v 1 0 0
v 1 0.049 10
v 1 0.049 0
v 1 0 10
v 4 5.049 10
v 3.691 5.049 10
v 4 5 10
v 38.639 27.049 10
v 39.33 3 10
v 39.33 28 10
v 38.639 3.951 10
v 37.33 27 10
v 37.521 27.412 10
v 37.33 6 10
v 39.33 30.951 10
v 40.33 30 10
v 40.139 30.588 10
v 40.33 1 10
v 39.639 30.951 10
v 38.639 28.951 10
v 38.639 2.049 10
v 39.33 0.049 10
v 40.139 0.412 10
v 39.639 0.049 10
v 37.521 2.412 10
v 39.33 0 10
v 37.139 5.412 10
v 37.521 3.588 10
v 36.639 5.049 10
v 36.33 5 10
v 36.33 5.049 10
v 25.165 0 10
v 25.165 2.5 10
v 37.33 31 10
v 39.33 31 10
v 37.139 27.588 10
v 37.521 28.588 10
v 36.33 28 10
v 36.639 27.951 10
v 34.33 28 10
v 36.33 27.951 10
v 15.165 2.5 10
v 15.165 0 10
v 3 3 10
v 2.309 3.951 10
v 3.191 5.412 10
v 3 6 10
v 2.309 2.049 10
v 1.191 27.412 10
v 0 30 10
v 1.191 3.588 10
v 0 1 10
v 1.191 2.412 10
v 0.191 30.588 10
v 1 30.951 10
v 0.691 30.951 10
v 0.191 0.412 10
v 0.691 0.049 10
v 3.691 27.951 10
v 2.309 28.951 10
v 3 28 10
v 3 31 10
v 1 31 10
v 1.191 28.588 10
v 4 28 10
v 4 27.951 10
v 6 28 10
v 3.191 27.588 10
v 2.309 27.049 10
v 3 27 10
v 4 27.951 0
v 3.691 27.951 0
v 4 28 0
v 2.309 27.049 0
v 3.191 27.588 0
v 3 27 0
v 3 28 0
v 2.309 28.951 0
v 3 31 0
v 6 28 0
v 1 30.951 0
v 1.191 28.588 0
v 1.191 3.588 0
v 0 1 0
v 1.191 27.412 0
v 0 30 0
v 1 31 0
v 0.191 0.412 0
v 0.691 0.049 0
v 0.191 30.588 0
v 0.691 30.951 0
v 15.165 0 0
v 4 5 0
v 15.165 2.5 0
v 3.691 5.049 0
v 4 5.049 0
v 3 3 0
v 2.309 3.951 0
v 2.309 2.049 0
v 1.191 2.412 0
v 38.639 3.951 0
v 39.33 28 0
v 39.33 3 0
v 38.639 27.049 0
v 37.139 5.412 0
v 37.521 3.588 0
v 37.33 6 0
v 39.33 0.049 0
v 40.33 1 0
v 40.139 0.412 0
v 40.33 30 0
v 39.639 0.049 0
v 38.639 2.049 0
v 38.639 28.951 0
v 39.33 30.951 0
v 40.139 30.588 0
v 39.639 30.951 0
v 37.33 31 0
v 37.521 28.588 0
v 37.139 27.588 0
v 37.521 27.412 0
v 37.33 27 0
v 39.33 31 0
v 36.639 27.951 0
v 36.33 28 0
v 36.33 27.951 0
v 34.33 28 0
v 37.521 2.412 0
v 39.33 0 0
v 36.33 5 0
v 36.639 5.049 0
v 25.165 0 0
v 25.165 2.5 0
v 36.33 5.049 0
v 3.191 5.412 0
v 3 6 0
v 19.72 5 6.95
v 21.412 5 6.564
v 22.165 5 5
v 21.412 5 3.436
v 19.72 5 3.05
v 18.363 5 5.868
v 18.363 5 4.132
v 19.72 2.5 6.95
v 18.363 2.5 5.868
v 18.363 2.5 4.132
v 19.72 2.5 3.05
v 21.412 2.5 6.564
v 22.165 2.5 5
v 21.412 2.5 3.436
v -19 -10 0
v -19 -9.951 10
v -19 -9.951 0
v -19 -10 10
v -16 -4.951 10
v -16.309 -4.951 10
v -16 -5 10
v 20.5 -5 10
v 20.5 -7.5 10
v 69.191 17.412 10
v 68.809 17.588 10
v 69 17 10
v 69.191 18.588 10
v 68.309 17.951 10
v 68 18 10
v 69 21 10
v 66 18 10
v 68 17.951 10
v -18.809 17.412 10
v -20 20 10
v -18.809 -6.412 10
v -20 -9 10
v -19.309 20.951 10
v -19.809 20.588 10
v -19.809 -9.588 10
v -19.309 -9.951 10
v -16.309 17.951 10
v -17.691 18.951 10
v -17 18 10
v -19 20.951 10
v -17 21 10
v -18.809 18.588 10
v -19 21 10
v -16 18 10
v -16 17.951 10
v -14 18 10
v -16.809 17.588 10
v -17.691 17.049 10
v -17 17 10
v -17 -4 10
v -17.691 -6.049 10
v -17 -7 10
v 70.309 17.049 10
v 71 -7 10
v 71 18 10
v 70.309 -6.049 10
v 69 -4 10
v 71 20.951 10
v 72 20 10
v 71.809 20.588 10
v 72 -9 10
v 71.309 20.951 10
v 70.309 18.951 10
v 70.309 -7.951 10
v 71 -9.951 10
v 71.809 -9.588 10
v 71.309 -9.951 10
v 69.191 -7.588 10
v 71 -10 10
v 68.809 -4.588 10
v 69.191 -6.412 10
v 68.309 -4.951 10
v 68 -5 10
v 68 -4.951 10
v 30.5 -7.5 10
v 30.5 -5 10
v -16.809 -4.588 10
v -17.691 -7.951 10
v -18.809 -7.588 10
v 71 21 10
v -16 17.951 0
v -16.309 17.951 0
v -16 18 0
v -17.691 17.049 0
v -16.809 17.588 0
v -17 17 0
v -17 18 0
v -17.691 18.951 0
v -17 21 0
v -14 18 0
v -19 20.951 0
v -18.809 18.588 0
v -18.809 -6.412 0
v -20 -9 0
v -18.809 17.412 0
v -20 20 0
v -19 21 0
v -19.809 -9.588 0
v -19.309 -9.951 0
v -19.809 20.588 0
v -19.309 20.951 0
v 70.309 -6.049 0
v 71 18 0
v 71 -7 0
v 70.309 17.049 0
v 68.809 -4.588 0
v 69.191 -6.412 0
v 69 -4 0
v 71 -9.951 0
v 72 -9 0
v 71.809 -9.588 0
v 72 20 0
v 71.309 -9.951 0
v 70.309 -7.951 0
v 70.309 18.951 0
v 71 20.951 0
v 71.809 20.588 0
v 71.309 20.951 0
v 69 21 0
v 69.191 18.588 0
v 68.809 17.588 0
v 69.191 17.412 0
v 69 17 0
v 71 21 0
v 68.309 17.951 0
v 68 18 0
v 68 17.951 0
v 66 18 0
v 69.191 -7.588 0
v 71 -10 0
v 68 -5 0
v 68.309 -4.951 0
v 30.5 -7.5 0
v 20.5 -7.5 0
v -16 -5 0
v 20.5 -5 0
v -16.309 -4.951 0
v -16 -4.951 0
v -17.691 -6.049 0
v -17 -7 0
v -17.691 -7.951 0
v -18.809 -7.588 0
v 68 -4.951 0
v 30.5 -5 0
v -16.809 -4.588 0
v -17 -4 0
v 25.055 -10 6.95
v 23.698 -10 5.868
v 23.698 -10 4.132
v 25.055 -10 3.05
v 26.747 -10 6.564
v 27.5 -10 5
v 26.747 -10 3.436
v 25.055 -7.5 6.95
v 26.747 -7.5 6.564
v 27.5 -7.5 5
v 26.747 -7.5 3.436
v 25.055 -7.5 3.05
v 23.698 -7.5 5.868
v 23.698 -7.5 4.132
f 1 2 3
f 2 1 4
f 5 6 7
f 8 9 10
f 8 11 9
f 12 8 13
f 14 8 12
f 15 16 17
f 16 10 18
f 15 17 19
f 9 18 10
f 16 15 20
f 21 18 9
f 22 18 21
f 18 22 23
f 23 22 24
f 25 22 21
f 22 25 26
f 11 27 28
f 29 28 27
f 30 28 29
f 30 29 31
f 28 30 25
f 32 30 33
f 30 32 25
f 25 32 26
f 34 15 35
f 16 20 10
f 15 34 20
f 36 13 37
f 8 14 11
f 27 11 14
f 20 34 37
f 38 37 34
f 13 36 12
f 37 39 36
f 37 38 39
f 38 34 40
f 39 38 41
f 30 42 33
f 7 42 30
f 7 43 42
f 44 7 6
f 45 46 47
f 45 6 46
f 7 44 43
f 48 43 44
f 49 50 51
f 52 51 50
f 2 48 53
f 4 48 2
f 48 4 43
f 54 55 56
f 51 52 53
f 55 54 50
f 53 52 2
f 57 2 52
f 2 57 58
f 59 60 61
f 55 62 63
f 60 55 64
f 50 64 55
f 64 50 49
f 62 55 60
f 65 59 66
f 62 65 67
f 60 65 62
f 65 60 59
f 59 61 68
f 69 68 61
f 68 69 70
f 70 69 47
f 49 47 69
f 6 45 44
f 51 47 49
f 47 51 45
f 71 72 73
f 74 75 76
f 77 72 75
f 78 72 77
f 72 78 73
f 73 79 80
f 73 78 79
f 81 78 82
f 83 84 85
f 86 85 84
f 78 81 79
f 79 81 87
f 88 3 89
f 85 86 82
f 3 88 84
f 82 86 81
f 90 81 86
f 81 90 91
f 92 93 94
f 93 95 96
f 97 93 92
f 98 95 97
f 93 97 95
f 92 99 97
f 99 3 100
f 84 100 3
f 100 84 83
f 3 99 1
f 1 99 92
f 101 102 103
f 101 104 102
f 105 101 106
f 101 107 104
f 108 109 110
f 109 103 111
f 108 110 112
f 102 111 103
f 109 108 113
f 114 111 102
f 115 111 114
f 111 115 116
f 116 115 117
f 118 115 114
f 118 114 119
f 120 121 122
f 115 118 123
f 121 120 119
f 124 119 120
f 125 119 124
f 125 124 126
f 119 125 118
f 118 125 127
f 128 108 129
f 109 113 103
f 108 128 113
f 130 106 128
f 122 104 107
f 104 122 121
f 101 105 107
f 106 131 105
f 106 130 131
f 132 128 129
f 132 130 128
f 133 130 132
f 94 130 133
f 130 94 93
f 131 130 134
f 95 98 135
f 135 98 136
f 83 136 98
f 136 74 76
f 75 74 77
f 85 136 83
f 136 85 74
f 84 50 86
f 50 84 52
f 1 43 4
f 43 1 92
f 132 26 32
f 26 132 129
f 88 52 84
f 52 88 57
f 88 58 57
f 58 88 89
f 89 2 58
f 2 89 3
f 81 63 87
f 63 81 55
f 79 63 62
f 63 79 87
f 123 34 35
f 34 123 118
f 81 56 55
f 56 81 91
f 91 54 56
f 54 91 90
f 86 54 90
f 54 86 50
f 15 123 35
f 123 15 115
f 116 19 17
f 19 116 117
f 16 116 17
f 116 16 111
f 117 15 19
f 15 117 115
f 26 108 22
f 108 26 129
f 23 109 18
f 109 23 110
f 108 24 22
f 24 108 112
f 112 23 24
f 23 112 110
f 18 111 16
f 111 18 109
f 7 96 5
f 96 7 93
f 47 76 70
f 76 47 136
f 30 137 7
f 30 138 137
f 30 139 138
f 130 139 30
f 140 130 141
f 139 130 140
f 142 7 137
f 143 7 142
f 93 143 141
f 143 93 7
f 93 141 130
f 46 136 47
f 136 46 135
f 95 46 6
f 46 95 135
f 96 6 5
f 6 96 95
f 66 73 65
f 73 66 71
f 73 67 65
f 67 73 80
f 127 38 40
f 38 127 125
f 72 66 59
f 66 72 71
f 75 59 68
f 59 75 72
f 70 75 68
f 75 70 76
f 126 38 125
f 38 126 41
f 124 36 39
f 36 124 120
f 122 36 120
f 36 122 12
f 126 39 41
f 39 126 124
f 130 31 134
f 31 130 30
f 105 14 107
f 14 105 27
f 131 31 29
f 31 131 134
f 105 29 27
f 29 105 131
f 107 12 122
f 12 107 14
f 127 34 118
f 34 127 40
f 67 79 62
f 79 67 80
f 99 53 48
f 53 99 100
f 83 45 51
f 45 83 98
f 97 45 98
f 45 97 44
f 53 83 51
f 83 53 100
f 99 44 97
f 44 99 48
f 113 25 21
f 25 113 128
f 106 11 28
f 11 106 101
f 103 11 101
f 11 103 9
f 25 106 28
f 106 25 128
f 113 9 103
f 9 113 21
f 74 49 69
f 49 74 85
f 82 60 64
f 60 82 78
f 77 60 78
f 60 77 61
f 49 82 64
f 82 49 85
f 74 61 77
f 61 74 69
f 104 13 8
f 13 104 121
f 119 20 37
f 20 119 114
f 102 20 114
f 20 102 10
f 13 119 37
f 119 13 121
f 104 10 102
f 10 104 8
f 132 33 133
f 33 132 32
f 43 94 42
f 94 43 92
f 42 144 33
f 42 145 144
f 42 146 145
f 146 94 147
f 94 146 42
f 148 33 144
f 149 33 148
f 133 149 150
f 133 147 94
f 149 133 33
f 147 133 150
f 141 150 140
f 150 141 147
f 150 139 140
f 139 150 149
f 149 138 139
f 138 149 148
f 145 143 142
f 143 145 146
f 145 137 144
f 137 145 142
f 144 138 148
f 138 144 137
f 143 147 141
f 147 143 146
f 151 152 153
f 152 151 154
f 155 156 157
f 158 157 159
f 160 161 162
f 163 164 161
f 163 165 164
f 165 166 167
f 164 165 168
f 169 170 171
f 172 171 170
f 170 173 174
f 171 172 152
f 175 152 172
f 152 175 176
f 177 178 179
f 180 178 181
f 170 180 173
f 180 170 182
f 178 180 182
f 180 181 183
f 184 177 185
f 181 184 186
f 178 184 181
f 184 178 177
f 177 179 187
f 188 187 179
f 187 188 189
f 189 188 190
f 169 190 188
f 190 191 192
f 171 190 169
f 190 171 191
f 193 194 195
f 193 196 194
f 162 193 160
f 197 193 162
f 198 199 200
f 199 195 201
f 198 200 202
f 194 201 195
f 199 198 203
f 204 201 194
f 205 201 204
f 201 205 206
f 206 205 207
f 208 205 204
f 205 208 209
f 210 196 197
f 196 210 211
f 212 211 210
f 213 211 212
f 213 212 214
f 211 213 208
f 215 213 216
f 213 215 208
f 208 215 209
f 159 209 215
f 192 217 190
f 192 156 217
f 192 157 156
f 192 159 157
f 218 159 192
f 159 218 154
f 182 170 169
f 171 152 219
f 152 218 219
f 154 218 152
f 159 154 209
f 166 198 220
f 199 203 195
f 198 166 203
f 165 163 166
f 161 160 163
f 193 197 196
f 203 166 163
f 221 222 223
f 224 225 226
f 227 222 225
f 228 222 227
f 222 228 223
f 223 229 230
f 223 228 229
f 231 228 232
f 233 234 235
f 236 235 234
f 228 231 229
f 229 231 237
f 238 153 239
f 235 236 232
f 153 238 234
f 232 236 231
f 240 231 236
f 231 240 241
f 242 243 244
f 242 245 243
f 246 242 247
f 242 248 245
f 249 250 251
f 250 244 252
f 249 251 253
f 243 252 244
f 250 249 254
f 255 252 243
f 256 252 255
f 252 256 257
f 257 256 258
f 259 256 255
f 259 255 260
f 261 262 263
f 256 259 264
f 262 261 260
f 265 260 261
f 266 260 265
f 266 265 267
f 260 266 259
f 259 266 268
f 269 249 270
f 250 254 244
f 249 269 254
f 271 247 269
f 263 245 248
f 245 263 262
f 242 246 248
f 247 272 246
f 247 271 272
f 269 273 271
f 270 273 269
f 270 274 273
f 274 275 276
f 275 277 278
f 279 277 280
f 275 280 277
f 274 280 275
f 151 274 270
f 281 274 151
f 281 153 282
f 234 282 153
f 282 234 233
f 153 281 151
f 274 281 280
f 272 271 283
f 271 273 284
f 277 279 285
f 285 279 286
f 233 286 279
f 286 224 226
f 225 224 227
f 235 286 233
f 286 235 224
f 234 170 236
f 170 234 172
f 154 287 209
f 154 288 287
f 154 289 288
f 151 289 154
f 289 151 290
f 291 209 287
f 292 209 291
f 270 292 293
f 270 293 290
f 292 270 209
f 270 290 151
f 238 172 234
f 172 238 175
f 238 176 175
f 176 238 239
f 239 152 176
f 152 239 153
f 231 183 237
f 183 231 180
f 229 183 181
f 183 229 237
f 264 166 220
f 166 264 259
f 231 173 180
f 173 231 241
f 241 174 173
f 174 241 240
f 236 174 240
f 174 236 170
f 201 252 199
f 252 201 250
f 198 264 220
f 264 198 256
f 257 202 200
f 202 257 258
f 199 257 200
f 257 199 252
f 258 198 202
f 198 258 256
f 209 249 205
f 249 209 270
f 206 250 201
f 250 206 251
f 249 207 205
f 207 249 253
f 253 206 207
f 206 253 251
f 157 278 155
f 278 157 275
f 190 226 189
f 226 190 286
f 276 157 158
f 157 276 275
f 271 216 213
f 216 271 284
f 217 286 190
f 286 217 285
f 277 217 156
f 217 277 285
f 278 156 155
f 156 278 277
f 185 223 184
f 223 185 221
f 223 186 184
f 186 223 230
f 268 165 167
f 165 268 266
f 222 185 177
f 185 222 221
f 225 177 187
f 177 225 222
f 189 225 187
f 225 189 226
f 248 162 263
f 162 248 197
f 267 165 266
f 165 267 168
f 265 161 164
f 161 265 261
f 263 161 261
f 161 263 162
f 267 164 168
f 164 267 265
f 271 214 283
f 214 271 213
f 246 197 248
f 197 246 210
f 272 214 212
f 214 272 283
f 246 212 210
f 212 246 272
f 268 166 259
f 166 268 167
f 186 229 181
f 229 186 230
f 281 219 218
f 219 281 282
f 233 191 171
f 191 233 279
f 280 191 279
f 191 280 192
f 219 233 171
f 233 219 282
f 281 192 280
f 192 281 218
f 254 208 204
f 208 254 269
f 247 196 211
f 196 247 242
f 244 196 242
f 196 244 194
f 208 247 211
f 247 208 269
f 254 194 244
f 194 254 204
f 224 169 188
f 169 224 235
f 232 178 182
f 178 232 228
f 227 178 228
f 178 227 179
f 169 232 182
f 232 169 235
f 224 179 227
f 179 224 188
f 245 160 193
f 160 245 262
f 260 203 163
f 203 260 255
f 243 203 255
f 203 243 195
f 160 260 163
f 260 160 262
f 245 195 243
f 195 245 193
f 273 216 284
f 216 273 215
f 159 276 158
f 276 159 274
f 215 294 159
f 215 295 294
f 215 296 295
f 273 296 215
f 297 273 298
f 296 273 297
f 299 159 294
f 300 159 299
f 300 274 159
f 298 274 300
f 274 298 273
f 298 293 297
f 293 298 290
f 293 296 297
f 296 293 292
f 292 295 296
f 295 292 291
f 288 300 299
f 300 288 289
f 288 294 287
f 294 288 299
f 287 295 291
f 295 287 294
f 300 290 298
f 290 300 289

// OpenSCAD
// file: moteclip.scad
module cuber(w,d,h, r) {
  myfn = 10;


  difference() {
    cube([w,d,h]);

    // bottom left
    translate([r,r,0])
      difference() {
        translate([-r,-r,0]) cube([r,r,h]);
        cylinder(h, r,r, $fn=myfn);
    }
    
    // top left
    translate([r, d-r,0])
      difference() {
      translate([-r,0,0]) cube([r,r,h]);
      cylinder(h,r,r, $fn=myfn);
      }

    // top right
    translate([w-r, d-r,0])
      difference() {
      translate([0,0,0]) cube([r,r,h]);
      cylinder(h,r,r, $fn=myfn);
      }


    // bottom right
    translate([w-r, r,0])
      difference() {
      translate([0,-r,0]) cube([r,r,h]);
      cylinder(h+2,r,r, $fn=myfn);
      }

  }
}

module moteclip(depth, mote_w, mote_h, wall_width, base_height, clip_depth, clip_angle) {
  // outer bounding width:
  outer_w = mote_w + 2*wall_width;

  echo(outer_w);

  // How high does our clip need to be given the depth and angle?
  clip_height = clip_depth/tan(clip_angle);


  // outer bounding height
  outer_h = mote_h + base_height + clip_height;

  // round the corners by this much
  cornerR = 1;


  // how much to hollow out in the corners to avoid overfill (which
  // breaks the print)
  incornerHollow = 1;

  clipcornerHollow = 1;


  difference() {

      translate([0, 0, 0]) cuber(outer_w, outer_h, depth, cornerR);

    translate([wall_width,base_height,0]) cuber(mote_w, mote_h, depth, cornerR);
    //cube([mote_w, mote_h, depth]);
    

      // remove the parallelogram for the clip gap
      translate([wall_width, outer_h,0]) 
	linear_extrude(height=depth, center=false) 
	polygon( points=[[0,0], [clip_depth,-clip_height], [mote_w-clip_depth,-clip_height], [mote_w,0]]);


      // hollow out the corners, so it doesn't overfill and break itself
      translate([wall_width/2+incornerHollow/2, base_height/2+incornerHollow/2,0]) cylinder(depth, incornerHollow, incornerHollow);
	translate([outer_w-(wall_width/2+incornerHollow/2), base_height/2+incornerHollow/2,0]) cylinder(depth, incornerHollow, incornerHollow);

	translate([wall_width/2+clipcornerHollow/2, outer_h-(base_height/2+clipcornerHollow/2),0]) cylinder(depth, clipcornerHollow, clipcornerHollow);
	translate([outer_w-(wall_width/2+clipcornerHollow/2), outer_h-(base_height/2+clipcornerHollow/2),0]) cylinder(depth, clipcornerHollow, clipcornerHollow);



  }
}



module oldclip() {
    cube([outer_w,outer_h,depth]);
    translate([outer_w-cornerR, outer_h-cornerR, 0]) 
      difference() {
      cube([cornerR, cornerR, depth]);
      cylinder(depth+2, cornerR, cornerR, $fn=10);
    }

    translate([cornerR, outer_h-cornerR, 0]) 
      difference() {
      translate([-cornerR, 0,0])
      cube([cornerR, cornerR, depth]);
      cylinder(depth+2, cornerR, cornerR, $fn=10);
    }

      
    translate([outer_w-cornerR, cornerR, 0]) 
      difference() {
      translate([0, -cornerR, 0])
      cube([cornerR, cornerR, depth]);
      cylinder(depth+2, cornerR, cornerR, $fn=10);
    }


    translate([cornerR, cornerR, 0]) 
      difference() {
      translate([-cornerR, -cornerR,0])
      cube([cornerR, cornerR, depth]);
      cylinder(depth+2, cornerR, cornerR, $fn=10);
    }

}
// main file
// A holster for Calvin's moon nightlight remote
//
// Released to the public domain
//
// Remote dimensions:
// 33.33mm wide
// 85mm tall
// 45mm from bottom of mote to bottom of bottommost button
// 20.25mm deep
//

// needs to accept a 6mm diameter screw (will drill out)

// NB: the base_height below is pretty tight, since you have to fit a
// countersunk screw in there.  You might want to beef it up a mm or
// two.

include <moteclip.scad>;


moteW = 33.33+1;
moteH = 20.25 + 2.75; // added slop, since we're capturing it fully now
moteL = 85 + 1;

wallW = 3;
baseH = 5;
clipD = 10;
clipW = 3;
clipA = 45;


notchW = 10;
notchD = baseH/2;

screwR = 4/2;

midline = (moteW+2*wallW)/2;


difference() {

    moteclip(clipD, 
	     moteW, moteH,
	     wallW, baseH,
	     clipW, clipA);

 translate([midline-notchW/2, 0,0]) cube([notchW, notchD, clipD   ], false);
    translate([midline,0,clipD/2]) rotate([-90,0,0]) cylinder(baseH, screwR, screwR, false);
}



translate([-20,-10,0]) difference() {
  moteclip(notchW,
	   moteL, moteH,
	   wallW, baseH, clipW, clipA);

 translate([(85+wallW*2-clipD)/2, baseH/2, 0]) cube([clipD, notchD, notchW], false);
 translate([(85+wallW*2)/2,0,notchW/2]) rotate([-90,0,0]) cylinder(baseH, screwR, screwR, false);
}
